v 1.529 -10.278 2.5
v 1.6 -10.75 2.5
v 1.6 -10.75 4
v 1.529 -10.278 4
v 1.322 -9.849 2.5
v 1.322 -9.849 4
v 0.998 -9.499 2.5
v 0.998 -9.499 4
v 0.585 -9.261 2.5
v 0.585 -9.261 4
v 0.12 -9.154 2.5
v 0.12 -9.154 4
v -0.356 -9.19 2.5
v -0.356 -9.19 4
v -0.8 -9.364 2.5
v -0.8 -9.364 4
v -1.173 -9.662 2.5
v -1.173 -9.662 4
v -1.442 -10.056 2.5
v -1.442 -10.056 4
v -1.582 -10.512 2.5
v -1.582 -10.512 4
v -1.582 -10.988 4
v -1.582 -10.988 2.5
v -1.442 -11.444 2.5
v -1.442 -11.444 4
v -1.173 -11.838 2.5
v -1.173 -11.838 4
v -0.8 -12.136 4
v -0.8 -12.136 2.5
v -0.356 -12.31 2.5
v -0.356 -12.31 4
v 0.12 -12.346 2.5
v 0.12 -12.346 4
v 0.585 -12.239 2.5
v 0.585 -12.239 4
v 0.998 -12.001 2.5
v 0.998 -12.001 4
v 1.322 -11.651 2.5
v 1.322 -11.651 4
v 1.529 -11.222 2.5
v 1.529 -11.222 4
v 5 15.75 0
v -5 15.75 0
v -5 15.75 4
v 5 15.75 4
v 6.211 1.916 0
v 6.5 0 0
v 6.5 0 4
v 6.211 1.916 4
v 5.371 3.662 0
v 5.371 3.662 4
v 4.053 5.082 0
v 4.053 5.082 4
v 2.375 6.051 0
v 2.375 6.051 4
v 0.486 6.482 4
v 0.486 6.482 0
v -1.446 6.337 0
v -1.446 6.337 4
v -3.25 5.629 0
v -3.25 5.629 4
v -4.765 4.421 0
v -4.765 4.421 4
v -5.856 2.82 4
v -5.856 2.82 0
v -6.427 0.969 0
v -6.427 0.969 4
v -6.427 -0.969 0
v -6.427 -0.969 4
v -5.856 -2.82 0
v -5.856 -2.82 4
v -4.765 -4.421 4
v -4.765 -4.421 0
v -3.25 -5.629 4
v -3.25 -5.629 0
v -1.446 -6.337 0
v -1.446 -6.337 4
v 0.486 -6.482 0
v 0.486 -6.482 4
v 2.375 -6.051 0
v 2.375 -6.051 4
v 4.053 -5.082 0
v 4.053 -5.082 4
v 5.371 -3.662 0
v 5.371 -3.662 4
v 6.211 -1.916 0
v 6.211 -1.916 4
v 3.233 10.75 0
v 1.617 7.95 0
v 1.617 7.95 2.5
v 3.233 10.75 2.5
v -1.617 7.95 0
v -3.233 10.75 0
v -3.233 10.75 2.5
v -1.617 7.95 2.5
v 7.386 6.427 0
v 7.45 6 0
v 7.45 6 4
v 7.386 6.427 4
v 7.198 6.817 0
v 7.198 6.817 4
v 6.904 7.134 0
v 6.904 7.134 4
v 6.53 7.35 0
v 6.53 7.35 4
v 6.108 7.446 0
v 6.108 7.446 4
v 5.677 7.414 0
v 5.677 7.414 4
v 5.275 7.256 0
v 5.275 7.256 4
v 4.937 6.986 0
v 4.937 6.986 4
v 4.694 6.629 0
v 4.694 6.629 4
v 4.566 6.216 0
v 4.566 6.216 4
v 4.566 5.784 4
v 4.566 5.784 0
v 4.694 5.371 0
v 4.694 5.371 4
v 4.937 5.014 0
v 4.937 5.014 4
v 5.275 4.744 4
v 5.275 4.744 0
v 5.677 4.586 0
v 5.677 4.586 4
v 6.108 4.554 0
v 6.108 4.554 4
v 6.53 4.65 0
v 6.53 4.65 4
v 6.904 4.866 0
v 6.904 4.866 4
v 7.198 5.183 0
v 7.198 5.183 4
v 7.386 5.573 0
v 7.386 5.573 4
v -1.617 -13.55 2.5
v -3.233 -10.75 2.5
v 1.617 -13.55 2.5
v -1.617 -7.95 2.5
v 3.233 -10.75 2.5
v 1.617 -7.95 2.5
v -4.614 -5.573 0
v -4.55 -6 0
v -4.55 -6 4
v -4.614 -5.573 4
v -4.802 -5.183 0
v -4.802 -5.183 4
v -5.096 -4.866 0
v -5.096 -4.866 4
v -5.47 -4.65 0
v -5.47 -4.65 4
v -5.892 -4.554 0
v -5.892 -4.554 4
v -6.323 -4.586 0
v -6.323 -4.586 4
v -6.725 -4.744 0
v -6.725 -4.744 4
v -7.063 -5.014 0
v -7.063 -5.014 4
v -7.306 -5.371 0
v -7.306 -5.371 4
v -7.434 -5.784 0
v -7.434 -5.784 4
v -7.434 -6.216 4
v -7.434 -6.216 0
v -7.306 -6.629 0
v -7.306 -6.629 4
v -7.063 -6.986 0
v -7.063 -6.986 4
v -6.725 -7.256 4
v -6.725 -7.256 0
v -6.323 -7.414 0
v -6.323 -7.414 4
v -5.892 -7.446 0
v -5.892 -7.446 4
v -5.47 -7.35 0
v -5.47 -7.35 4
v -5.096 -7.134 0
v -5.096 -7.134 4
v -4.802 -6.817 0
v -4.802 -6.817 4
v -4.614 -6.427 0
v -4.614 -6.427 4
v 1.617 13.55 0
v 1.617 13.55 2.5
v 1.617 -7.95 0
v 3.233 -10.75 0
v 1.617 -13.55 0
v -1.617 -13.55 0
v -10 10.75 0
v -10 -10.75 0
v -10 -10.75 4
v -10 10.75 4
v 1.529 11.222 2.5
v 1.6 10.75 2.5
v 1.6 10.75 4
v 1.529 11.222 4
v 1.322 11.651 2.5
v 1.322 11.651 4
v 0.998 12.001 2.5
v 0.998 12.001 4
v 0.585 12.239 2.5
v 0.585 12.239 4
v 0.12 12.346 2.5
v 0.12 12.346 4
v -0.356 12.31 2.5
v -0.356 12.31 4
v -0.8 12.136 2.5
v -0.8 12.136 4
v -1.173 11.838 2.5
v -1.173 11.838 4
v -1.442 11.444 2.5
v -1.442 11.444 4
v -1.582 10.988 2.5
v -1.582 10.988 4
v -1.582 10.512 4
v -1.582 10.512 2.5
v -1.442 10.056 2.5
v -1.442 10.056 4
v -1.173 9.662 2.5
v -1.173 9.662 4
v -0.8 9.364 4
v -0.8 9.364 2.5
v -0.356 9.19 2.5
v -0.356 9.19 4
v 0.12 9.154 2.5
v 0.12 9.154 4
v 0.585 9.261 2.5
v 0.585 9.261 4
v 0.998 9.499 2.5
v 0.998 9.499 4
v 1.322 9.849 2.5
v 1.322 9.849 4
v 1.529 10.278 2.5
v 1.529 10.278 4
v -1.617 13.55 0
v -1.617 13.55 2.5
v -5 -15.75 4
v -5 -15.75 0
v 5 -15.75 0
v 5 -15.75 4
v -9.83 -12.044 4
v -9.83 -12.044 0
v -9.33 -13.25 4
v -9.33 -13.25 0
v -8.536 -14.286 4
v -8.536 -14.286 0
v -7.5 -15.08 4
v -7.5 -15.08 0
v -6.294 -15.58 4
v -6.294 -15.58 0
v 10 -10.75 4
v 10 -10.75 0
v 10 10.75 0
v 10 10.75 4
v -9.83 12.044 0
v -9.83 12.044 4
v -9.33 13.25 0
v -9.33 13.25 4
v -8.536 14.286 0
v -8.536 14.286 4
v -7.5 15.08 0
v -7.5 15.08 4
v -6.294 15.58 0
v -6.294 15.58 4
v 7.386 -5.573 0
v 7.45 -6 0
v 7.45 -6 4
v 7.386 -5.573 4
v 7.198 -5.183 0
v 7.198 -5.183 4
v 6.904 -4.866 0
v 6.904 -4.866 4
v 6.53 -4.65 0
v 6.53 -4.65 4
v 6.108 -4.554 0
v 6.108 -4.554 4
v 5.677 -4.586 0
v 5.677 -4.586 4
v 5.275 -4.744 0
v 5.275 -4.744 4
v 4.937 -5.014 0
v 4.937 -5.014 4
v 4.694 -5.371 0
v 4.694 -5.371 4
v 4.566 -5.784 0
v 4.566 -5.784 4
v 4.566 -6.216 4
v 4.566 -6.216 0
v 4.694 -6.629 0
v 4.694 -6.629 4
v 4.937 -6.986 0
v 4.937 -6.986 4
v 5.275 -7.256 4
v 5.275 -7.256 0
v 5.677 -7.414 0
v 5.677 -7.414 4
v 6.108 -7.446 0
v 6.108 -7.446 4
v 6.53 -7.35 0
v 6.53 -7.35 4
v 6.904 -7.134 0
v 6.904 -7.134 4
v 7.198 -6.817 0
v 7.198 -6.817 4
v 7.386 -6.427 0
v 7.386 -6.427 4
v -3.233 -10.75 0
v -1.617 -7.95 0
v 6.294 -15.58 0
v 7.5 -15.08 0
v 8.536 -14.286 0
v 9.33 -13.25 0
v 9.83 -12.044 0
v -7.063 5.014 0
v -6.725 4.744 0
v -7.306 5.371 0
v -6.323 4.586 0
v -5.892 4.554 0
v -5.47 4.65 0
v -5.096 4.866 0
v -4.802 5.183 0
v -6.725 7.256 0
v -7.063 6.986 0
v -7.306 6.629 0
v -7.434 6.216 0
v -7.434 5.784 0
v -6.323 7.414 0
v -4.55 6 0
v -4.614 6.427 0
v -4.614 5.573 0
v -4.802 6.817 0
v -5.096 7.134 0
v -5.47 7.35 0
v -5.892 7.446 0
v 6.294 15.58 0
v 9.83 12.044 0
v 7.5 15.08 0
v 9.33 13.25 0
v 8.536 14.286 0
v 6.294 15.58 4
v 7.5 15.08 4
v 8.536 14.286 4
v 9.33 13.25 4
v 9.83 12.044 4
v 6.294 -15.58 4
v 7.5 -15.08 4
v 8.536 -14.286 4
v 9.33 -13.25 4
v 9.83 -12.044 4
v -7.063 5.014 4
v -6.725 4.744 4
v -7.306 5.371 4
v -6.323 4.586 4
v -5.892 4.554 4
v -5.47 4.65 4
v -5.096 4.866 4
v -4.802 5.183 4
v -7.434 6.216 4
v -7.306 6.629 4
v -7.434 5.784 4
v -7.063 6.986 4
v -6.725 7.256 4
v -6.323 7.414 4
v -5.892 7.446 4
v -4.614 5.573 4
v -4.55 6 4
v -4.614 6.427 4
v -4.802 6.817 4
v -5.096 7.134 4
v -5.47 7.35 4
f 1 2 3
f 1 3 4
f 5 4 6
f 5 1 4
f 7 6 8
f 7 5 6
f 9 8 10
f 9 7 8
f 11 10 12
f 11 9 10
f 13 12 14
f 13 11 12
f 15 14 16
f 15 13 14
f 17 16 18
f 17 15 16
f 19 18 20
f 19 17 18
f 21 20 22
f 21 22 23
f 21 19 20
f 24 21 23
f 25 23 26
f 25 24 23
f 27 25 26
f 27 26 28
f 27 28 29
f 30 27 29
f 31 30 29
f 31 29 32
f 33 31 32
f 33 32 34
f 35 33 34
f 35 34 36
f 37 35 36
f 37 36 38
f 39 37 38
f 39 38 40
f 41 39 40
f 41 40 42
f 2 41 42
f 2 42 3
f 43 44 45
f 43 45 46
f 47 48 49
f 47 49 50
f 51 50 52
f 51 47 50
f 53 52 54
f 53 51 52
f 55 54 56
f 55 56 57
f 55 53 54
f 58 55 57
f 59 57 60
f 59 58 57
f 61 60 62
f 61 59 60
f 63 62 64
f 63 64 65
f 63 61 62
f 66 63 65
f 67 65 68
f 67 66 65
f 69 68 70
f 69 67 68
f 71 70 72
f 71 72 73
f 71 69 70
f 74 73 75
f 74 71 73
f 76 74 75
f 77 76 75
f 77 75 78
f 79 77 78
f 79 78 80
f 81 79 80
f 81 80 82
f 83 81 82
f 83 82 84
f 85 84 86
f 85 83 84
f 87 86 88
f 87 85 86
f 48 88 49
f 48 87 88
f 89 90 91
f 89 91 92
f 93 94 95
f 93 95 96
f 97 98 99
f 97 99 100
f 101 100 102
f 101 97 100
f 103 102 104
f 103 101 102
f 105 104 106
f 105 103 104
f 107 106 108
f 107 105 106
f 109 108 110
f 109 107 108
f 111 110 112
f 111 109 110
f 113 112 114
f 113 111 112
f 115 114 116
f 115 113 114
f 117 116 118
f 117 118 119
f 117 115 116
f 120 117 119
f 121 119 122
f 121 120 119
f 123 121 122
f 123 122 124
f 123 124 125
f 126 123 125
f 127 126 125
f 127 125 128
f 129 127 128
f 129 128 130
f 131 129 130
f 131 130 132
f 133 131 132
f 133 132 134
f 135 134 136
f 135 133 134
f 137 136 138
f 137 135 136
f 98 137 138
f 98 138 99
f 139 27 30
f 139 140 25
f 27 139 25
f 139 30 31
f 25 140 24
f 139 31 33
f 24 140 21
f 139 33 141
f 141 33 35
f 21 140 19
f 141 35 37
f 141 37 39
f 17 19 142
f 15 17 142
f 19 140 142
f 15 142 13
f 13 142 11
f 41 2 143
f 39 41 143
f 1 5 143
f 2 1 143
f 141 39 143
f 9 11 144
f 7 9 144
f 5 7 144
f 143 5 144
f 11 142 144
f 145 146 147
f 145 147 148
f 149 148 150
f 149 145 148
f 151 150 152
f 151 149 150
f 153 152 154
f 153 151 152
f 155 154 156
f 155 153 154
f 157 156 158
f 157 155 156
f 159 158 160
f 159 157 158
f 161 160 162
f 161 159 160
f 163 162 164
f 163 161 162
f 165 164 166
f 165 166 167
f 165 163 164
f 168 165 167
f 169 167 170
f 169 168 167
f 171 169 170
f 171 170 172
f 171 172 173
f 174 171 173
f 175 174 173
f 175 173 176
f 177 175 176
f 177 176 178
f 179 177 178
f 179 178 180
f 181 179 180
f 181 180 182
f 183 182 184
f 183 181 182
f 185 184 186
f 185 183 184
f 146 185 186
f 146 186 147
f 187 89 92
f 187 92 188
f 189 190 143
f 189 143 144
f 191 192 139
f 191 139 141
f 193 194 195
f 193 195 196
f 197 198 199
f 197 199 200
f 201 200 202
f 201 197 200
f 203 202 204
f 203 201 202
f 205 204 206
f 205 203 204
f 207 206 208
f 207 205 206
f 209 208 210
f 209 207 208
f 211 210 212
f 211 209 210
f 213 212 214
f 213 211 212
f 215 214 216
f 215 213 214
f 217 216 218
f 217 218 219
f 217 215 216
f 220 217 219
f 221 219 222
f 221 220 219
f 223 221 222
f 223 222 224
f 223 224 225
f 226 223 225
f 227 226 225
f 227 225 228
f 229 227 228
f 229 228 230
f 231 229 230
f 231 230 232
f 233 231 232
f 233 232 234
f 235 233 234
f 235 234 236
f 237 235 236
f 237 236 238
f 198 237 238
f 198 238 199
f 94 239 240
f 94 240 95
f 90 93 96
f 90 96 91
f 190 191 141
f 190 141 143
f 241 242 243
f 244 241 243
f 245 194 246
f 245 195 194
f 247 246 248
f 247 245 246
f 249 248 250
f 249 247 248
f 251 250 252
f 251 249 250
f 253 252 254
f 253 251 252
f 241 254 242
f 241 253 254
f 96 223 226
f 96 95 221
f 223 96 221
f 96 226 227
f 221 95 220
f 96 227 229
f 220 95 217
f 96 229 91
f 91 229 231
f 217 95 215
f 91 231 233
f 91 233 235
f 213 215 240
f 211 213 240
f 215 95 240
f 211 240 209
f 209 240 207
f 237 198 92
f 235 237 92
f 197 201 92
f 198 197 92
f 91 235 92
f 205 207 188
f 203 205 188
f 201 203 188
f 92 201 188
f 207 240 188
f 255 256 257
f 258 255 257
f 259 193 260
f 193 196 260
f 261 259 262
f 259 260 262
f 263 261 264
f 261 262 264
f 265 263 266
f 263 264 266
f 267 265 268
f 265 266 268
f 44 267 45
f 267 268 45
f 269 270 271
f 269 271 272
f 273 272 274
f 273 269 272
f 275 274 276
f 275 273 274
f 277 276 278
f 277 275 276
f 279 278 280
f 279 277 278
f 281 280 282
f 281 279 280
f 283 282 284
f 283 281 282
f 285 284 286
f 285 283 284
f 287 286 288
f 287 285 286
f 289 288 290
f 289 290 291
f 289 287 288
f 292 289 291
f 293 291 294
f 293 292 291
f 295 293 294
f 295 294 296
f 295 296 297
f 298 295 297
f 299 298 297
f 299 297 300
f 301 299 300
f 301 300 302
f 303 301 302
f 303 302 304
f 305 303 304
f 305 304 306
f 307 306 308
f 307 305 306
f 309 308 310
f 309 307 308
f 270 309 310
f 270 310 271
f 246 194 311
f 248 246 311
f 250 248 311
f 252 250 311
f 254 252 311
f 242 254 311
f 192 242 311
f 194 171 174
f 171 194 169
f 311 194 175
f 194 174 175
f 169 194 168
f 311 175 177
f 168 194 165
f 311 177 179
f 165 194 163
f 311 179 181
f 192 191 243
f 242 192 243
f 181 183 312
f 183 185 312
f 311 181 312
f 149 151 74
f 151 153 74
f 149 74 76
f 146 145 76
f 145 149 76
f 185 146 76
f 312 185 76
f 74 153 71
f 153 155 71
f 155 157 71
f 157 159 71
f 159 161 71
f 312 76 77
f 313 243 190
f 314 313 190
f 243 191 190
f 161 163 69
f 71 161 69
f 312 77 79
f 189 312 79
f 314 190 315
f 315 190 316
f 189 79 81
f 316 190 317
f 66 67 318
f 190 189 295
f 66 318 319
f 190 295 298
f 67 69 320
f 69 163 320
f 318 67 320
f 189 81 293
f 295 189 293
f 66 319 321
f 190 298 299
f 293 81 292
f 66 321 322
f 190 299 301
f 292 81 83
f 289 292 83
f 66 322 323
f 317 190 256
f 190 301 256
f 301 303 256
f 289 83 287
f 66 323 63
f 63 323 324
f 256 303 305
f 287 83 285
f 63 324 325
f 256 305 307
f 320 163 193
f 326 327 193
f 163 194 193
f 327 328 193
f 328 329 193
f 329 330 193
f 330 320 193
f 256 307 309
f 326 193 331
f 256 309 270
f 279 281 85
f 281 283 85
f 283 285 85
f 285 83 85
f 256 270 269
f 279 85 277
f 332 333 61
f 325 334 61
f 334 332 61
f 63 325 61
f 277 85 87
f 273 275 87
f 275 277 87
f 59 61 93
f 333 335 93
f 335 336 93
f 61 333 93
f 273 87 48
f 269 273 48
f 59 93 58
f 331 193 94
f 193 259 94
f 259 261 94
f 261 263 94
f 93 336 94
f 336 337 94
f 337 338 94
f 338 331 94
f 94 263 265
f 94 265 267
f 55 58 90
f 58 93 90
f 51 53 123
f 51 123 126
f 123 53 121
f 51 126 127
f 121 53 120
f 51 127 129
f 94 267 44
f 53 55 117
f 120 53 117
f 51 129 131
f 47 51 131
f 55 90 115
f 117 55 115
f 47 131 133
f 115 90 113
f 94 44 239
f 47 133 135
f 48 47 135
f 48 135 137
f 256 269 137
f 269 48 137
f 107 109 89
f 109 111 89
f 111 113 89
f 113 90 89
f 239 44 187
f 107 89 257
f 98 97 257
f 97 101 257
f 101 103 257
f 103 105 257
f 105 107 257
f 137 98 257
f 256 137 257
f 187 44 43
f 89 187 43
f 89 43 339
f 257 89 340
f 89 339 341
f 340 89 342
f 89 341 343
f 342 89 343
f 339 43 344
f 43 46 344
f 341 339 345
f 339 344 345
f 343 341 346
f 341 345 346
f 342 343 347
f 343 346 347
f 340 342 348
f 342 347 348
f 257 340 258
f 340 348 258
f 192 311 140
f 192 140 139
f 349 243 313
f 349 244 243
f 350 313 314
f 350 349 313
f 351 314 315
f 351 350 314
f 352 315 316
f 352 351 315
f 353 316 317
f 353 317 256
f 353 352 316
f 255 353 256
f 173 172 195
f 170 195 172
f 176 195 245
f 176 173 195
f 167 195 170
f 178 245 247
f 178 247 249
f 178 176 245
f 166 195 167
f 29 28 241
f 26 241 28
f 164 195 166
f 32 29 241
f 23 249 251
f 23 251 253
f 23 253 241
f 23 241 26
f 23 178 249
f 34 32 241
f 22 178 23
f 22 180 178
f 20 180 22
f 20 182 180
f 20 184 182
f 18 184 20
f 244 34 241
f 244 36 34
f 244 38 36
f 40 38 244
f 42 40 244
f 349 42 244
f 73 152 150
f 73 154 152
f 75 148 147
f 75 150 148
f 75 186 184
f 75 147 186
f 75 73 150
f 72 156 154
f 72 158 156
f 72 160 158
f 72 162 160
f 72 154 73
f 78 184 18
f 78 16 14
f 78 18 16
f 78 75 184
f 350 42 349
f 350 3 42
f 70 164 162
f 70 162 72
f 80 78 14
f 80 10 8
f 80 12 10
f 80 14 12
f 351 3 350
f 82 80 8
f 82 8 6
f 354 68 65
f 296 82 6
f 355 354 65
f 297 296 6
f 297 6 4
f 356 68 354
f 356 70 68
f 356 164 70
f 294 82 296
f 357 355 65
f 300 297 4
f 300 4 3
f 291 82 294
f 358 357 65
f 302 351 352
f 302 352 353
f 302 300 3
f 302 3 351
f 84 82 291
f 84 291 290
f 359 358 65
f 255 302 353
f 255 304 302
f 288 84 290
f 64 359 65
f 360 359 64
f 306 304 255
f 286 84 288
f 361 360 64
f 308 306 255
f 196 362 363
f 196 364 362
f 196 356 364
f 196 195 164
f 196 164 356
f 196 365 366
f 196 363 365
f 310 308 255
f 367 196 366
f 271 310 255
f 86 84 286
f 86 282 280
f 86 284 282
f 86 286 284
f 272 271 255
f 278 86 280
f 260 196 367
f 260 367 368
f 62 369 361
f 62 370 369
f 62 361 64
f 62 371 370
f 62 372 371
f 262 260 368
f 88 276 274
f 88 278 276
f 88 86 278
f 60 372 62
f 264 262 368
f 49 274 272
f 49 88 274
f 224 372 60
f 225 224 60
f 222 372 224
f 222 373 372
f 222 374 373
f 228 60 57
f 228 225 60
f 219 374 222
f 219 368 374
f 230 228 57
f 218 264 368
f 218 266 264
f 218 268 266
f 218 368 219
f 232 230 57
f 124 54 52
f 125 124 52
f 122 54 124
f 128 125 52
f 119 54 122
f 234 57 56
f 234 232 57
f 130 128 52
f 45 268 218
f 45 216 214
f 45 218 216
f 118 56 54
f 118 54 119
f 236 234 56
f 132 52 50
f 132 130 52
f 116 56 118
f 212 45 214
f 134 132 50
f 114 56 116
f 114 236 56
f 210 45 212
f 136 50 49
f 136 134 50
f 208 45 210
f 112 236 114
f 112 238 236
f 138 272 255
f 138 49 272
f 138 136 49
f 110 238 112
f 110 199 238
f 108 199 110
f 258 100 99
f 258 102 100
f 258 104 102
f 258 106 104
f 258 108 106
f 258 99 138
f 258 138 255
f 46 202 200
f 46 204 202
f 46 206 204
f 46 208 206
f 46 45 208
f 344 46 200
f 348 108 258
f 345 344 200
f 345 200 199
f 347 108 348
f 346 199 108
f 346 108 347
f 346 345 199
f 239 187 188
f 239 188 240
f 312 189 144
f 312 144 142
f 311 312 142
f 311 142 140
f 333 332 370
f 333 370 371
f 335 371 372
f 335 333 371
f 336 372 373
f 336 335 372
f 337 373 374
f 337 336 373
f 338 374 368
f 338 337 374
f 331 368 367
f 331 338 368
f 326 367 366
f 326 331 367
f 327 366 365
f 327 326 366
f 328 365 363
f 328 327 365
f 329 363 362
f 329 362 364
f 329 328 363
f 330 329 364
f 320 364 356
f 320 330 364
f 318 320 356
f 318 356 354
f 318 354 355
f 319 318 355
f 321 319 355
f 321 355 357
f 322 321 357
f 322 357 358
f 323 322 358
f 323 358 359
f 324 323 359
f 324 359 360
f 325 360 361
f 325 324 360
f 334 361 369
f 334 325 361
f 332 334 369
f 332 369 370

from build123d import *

# Parameters (mm, degrees)
SKETCH_W     = 20
SKETCH_H     = 31.5
SKETCH_R     = 1.6
SKETCH_R_2   = 6.5
SKETCH_R_3   = 1.45
PAD_DEPTH    = 4
POCKET_DEPTH = 2.5
FILLET_R     = 5


with BuildPart() as part:
    # Sketch → Pad (new body)
    with BuildSketch(Plane.XY):
        Rectangle(SKETCH_W, SKETCH_H)
        with Locations((0, 10.75)):
            Circle(SKETCH_R, mode=Mode.SUBTRACT)
        with Locations((0, -10.75)):
            Circle(SKETCH_R, mode=Mode.SUBTRACT)
        Circle(SKETCH_R_2, mode=Mode.SUBTRACT)
        with Locations((6, 6)):
            Circle(SKETCH_R_3, mode=Mode.SUBTRACT)
        with Locations((6, -6)):
            Circle(SKETCH_R_3, mode=Mode.SUBTRACT)
        with Locations((-6, -6)):
            Circle(SKETCH_R_3, mode=Mode.SUBTRACT)
        with Locations((-6, 6)):
            Circle(SKETCH_R_3, mode=Mode.SUBTRACT)
    extrude(amount=PAD_DEPTH)

    # Sketch001 → Pocket (cut)
    with BuildSketch(Plane.XY):
        Polygon((-1.616581, 7.95), (1.616581, 7.95), (3.233162, 10.75), (1.616581, 13.55), (-1.616581, 13.55), (-3.233162, 10.75), align=None)
        Polygon((-1.616581, -7.95), (-3.233162, -10.75), (-1.616581, -13.55), (1.616581, -13.55), (3.233162, -10.75), (1.616581, -7.95), align=None)
    extrude(amount=POCKET_DEPTH, mode=Mode.SUBTRACT)

    # Fillet
    fillet_edges = [part.edges().sort_by_distance(p)[0] for p in [
        (10, -15.75, 2),
        (10, 15.75, 2),
        (-10, 15.75, 2),
        (-10, -15.75, 2),
    ]]
    fillet(fillet_edges, radius=FILLET_R)


solid = part.part
